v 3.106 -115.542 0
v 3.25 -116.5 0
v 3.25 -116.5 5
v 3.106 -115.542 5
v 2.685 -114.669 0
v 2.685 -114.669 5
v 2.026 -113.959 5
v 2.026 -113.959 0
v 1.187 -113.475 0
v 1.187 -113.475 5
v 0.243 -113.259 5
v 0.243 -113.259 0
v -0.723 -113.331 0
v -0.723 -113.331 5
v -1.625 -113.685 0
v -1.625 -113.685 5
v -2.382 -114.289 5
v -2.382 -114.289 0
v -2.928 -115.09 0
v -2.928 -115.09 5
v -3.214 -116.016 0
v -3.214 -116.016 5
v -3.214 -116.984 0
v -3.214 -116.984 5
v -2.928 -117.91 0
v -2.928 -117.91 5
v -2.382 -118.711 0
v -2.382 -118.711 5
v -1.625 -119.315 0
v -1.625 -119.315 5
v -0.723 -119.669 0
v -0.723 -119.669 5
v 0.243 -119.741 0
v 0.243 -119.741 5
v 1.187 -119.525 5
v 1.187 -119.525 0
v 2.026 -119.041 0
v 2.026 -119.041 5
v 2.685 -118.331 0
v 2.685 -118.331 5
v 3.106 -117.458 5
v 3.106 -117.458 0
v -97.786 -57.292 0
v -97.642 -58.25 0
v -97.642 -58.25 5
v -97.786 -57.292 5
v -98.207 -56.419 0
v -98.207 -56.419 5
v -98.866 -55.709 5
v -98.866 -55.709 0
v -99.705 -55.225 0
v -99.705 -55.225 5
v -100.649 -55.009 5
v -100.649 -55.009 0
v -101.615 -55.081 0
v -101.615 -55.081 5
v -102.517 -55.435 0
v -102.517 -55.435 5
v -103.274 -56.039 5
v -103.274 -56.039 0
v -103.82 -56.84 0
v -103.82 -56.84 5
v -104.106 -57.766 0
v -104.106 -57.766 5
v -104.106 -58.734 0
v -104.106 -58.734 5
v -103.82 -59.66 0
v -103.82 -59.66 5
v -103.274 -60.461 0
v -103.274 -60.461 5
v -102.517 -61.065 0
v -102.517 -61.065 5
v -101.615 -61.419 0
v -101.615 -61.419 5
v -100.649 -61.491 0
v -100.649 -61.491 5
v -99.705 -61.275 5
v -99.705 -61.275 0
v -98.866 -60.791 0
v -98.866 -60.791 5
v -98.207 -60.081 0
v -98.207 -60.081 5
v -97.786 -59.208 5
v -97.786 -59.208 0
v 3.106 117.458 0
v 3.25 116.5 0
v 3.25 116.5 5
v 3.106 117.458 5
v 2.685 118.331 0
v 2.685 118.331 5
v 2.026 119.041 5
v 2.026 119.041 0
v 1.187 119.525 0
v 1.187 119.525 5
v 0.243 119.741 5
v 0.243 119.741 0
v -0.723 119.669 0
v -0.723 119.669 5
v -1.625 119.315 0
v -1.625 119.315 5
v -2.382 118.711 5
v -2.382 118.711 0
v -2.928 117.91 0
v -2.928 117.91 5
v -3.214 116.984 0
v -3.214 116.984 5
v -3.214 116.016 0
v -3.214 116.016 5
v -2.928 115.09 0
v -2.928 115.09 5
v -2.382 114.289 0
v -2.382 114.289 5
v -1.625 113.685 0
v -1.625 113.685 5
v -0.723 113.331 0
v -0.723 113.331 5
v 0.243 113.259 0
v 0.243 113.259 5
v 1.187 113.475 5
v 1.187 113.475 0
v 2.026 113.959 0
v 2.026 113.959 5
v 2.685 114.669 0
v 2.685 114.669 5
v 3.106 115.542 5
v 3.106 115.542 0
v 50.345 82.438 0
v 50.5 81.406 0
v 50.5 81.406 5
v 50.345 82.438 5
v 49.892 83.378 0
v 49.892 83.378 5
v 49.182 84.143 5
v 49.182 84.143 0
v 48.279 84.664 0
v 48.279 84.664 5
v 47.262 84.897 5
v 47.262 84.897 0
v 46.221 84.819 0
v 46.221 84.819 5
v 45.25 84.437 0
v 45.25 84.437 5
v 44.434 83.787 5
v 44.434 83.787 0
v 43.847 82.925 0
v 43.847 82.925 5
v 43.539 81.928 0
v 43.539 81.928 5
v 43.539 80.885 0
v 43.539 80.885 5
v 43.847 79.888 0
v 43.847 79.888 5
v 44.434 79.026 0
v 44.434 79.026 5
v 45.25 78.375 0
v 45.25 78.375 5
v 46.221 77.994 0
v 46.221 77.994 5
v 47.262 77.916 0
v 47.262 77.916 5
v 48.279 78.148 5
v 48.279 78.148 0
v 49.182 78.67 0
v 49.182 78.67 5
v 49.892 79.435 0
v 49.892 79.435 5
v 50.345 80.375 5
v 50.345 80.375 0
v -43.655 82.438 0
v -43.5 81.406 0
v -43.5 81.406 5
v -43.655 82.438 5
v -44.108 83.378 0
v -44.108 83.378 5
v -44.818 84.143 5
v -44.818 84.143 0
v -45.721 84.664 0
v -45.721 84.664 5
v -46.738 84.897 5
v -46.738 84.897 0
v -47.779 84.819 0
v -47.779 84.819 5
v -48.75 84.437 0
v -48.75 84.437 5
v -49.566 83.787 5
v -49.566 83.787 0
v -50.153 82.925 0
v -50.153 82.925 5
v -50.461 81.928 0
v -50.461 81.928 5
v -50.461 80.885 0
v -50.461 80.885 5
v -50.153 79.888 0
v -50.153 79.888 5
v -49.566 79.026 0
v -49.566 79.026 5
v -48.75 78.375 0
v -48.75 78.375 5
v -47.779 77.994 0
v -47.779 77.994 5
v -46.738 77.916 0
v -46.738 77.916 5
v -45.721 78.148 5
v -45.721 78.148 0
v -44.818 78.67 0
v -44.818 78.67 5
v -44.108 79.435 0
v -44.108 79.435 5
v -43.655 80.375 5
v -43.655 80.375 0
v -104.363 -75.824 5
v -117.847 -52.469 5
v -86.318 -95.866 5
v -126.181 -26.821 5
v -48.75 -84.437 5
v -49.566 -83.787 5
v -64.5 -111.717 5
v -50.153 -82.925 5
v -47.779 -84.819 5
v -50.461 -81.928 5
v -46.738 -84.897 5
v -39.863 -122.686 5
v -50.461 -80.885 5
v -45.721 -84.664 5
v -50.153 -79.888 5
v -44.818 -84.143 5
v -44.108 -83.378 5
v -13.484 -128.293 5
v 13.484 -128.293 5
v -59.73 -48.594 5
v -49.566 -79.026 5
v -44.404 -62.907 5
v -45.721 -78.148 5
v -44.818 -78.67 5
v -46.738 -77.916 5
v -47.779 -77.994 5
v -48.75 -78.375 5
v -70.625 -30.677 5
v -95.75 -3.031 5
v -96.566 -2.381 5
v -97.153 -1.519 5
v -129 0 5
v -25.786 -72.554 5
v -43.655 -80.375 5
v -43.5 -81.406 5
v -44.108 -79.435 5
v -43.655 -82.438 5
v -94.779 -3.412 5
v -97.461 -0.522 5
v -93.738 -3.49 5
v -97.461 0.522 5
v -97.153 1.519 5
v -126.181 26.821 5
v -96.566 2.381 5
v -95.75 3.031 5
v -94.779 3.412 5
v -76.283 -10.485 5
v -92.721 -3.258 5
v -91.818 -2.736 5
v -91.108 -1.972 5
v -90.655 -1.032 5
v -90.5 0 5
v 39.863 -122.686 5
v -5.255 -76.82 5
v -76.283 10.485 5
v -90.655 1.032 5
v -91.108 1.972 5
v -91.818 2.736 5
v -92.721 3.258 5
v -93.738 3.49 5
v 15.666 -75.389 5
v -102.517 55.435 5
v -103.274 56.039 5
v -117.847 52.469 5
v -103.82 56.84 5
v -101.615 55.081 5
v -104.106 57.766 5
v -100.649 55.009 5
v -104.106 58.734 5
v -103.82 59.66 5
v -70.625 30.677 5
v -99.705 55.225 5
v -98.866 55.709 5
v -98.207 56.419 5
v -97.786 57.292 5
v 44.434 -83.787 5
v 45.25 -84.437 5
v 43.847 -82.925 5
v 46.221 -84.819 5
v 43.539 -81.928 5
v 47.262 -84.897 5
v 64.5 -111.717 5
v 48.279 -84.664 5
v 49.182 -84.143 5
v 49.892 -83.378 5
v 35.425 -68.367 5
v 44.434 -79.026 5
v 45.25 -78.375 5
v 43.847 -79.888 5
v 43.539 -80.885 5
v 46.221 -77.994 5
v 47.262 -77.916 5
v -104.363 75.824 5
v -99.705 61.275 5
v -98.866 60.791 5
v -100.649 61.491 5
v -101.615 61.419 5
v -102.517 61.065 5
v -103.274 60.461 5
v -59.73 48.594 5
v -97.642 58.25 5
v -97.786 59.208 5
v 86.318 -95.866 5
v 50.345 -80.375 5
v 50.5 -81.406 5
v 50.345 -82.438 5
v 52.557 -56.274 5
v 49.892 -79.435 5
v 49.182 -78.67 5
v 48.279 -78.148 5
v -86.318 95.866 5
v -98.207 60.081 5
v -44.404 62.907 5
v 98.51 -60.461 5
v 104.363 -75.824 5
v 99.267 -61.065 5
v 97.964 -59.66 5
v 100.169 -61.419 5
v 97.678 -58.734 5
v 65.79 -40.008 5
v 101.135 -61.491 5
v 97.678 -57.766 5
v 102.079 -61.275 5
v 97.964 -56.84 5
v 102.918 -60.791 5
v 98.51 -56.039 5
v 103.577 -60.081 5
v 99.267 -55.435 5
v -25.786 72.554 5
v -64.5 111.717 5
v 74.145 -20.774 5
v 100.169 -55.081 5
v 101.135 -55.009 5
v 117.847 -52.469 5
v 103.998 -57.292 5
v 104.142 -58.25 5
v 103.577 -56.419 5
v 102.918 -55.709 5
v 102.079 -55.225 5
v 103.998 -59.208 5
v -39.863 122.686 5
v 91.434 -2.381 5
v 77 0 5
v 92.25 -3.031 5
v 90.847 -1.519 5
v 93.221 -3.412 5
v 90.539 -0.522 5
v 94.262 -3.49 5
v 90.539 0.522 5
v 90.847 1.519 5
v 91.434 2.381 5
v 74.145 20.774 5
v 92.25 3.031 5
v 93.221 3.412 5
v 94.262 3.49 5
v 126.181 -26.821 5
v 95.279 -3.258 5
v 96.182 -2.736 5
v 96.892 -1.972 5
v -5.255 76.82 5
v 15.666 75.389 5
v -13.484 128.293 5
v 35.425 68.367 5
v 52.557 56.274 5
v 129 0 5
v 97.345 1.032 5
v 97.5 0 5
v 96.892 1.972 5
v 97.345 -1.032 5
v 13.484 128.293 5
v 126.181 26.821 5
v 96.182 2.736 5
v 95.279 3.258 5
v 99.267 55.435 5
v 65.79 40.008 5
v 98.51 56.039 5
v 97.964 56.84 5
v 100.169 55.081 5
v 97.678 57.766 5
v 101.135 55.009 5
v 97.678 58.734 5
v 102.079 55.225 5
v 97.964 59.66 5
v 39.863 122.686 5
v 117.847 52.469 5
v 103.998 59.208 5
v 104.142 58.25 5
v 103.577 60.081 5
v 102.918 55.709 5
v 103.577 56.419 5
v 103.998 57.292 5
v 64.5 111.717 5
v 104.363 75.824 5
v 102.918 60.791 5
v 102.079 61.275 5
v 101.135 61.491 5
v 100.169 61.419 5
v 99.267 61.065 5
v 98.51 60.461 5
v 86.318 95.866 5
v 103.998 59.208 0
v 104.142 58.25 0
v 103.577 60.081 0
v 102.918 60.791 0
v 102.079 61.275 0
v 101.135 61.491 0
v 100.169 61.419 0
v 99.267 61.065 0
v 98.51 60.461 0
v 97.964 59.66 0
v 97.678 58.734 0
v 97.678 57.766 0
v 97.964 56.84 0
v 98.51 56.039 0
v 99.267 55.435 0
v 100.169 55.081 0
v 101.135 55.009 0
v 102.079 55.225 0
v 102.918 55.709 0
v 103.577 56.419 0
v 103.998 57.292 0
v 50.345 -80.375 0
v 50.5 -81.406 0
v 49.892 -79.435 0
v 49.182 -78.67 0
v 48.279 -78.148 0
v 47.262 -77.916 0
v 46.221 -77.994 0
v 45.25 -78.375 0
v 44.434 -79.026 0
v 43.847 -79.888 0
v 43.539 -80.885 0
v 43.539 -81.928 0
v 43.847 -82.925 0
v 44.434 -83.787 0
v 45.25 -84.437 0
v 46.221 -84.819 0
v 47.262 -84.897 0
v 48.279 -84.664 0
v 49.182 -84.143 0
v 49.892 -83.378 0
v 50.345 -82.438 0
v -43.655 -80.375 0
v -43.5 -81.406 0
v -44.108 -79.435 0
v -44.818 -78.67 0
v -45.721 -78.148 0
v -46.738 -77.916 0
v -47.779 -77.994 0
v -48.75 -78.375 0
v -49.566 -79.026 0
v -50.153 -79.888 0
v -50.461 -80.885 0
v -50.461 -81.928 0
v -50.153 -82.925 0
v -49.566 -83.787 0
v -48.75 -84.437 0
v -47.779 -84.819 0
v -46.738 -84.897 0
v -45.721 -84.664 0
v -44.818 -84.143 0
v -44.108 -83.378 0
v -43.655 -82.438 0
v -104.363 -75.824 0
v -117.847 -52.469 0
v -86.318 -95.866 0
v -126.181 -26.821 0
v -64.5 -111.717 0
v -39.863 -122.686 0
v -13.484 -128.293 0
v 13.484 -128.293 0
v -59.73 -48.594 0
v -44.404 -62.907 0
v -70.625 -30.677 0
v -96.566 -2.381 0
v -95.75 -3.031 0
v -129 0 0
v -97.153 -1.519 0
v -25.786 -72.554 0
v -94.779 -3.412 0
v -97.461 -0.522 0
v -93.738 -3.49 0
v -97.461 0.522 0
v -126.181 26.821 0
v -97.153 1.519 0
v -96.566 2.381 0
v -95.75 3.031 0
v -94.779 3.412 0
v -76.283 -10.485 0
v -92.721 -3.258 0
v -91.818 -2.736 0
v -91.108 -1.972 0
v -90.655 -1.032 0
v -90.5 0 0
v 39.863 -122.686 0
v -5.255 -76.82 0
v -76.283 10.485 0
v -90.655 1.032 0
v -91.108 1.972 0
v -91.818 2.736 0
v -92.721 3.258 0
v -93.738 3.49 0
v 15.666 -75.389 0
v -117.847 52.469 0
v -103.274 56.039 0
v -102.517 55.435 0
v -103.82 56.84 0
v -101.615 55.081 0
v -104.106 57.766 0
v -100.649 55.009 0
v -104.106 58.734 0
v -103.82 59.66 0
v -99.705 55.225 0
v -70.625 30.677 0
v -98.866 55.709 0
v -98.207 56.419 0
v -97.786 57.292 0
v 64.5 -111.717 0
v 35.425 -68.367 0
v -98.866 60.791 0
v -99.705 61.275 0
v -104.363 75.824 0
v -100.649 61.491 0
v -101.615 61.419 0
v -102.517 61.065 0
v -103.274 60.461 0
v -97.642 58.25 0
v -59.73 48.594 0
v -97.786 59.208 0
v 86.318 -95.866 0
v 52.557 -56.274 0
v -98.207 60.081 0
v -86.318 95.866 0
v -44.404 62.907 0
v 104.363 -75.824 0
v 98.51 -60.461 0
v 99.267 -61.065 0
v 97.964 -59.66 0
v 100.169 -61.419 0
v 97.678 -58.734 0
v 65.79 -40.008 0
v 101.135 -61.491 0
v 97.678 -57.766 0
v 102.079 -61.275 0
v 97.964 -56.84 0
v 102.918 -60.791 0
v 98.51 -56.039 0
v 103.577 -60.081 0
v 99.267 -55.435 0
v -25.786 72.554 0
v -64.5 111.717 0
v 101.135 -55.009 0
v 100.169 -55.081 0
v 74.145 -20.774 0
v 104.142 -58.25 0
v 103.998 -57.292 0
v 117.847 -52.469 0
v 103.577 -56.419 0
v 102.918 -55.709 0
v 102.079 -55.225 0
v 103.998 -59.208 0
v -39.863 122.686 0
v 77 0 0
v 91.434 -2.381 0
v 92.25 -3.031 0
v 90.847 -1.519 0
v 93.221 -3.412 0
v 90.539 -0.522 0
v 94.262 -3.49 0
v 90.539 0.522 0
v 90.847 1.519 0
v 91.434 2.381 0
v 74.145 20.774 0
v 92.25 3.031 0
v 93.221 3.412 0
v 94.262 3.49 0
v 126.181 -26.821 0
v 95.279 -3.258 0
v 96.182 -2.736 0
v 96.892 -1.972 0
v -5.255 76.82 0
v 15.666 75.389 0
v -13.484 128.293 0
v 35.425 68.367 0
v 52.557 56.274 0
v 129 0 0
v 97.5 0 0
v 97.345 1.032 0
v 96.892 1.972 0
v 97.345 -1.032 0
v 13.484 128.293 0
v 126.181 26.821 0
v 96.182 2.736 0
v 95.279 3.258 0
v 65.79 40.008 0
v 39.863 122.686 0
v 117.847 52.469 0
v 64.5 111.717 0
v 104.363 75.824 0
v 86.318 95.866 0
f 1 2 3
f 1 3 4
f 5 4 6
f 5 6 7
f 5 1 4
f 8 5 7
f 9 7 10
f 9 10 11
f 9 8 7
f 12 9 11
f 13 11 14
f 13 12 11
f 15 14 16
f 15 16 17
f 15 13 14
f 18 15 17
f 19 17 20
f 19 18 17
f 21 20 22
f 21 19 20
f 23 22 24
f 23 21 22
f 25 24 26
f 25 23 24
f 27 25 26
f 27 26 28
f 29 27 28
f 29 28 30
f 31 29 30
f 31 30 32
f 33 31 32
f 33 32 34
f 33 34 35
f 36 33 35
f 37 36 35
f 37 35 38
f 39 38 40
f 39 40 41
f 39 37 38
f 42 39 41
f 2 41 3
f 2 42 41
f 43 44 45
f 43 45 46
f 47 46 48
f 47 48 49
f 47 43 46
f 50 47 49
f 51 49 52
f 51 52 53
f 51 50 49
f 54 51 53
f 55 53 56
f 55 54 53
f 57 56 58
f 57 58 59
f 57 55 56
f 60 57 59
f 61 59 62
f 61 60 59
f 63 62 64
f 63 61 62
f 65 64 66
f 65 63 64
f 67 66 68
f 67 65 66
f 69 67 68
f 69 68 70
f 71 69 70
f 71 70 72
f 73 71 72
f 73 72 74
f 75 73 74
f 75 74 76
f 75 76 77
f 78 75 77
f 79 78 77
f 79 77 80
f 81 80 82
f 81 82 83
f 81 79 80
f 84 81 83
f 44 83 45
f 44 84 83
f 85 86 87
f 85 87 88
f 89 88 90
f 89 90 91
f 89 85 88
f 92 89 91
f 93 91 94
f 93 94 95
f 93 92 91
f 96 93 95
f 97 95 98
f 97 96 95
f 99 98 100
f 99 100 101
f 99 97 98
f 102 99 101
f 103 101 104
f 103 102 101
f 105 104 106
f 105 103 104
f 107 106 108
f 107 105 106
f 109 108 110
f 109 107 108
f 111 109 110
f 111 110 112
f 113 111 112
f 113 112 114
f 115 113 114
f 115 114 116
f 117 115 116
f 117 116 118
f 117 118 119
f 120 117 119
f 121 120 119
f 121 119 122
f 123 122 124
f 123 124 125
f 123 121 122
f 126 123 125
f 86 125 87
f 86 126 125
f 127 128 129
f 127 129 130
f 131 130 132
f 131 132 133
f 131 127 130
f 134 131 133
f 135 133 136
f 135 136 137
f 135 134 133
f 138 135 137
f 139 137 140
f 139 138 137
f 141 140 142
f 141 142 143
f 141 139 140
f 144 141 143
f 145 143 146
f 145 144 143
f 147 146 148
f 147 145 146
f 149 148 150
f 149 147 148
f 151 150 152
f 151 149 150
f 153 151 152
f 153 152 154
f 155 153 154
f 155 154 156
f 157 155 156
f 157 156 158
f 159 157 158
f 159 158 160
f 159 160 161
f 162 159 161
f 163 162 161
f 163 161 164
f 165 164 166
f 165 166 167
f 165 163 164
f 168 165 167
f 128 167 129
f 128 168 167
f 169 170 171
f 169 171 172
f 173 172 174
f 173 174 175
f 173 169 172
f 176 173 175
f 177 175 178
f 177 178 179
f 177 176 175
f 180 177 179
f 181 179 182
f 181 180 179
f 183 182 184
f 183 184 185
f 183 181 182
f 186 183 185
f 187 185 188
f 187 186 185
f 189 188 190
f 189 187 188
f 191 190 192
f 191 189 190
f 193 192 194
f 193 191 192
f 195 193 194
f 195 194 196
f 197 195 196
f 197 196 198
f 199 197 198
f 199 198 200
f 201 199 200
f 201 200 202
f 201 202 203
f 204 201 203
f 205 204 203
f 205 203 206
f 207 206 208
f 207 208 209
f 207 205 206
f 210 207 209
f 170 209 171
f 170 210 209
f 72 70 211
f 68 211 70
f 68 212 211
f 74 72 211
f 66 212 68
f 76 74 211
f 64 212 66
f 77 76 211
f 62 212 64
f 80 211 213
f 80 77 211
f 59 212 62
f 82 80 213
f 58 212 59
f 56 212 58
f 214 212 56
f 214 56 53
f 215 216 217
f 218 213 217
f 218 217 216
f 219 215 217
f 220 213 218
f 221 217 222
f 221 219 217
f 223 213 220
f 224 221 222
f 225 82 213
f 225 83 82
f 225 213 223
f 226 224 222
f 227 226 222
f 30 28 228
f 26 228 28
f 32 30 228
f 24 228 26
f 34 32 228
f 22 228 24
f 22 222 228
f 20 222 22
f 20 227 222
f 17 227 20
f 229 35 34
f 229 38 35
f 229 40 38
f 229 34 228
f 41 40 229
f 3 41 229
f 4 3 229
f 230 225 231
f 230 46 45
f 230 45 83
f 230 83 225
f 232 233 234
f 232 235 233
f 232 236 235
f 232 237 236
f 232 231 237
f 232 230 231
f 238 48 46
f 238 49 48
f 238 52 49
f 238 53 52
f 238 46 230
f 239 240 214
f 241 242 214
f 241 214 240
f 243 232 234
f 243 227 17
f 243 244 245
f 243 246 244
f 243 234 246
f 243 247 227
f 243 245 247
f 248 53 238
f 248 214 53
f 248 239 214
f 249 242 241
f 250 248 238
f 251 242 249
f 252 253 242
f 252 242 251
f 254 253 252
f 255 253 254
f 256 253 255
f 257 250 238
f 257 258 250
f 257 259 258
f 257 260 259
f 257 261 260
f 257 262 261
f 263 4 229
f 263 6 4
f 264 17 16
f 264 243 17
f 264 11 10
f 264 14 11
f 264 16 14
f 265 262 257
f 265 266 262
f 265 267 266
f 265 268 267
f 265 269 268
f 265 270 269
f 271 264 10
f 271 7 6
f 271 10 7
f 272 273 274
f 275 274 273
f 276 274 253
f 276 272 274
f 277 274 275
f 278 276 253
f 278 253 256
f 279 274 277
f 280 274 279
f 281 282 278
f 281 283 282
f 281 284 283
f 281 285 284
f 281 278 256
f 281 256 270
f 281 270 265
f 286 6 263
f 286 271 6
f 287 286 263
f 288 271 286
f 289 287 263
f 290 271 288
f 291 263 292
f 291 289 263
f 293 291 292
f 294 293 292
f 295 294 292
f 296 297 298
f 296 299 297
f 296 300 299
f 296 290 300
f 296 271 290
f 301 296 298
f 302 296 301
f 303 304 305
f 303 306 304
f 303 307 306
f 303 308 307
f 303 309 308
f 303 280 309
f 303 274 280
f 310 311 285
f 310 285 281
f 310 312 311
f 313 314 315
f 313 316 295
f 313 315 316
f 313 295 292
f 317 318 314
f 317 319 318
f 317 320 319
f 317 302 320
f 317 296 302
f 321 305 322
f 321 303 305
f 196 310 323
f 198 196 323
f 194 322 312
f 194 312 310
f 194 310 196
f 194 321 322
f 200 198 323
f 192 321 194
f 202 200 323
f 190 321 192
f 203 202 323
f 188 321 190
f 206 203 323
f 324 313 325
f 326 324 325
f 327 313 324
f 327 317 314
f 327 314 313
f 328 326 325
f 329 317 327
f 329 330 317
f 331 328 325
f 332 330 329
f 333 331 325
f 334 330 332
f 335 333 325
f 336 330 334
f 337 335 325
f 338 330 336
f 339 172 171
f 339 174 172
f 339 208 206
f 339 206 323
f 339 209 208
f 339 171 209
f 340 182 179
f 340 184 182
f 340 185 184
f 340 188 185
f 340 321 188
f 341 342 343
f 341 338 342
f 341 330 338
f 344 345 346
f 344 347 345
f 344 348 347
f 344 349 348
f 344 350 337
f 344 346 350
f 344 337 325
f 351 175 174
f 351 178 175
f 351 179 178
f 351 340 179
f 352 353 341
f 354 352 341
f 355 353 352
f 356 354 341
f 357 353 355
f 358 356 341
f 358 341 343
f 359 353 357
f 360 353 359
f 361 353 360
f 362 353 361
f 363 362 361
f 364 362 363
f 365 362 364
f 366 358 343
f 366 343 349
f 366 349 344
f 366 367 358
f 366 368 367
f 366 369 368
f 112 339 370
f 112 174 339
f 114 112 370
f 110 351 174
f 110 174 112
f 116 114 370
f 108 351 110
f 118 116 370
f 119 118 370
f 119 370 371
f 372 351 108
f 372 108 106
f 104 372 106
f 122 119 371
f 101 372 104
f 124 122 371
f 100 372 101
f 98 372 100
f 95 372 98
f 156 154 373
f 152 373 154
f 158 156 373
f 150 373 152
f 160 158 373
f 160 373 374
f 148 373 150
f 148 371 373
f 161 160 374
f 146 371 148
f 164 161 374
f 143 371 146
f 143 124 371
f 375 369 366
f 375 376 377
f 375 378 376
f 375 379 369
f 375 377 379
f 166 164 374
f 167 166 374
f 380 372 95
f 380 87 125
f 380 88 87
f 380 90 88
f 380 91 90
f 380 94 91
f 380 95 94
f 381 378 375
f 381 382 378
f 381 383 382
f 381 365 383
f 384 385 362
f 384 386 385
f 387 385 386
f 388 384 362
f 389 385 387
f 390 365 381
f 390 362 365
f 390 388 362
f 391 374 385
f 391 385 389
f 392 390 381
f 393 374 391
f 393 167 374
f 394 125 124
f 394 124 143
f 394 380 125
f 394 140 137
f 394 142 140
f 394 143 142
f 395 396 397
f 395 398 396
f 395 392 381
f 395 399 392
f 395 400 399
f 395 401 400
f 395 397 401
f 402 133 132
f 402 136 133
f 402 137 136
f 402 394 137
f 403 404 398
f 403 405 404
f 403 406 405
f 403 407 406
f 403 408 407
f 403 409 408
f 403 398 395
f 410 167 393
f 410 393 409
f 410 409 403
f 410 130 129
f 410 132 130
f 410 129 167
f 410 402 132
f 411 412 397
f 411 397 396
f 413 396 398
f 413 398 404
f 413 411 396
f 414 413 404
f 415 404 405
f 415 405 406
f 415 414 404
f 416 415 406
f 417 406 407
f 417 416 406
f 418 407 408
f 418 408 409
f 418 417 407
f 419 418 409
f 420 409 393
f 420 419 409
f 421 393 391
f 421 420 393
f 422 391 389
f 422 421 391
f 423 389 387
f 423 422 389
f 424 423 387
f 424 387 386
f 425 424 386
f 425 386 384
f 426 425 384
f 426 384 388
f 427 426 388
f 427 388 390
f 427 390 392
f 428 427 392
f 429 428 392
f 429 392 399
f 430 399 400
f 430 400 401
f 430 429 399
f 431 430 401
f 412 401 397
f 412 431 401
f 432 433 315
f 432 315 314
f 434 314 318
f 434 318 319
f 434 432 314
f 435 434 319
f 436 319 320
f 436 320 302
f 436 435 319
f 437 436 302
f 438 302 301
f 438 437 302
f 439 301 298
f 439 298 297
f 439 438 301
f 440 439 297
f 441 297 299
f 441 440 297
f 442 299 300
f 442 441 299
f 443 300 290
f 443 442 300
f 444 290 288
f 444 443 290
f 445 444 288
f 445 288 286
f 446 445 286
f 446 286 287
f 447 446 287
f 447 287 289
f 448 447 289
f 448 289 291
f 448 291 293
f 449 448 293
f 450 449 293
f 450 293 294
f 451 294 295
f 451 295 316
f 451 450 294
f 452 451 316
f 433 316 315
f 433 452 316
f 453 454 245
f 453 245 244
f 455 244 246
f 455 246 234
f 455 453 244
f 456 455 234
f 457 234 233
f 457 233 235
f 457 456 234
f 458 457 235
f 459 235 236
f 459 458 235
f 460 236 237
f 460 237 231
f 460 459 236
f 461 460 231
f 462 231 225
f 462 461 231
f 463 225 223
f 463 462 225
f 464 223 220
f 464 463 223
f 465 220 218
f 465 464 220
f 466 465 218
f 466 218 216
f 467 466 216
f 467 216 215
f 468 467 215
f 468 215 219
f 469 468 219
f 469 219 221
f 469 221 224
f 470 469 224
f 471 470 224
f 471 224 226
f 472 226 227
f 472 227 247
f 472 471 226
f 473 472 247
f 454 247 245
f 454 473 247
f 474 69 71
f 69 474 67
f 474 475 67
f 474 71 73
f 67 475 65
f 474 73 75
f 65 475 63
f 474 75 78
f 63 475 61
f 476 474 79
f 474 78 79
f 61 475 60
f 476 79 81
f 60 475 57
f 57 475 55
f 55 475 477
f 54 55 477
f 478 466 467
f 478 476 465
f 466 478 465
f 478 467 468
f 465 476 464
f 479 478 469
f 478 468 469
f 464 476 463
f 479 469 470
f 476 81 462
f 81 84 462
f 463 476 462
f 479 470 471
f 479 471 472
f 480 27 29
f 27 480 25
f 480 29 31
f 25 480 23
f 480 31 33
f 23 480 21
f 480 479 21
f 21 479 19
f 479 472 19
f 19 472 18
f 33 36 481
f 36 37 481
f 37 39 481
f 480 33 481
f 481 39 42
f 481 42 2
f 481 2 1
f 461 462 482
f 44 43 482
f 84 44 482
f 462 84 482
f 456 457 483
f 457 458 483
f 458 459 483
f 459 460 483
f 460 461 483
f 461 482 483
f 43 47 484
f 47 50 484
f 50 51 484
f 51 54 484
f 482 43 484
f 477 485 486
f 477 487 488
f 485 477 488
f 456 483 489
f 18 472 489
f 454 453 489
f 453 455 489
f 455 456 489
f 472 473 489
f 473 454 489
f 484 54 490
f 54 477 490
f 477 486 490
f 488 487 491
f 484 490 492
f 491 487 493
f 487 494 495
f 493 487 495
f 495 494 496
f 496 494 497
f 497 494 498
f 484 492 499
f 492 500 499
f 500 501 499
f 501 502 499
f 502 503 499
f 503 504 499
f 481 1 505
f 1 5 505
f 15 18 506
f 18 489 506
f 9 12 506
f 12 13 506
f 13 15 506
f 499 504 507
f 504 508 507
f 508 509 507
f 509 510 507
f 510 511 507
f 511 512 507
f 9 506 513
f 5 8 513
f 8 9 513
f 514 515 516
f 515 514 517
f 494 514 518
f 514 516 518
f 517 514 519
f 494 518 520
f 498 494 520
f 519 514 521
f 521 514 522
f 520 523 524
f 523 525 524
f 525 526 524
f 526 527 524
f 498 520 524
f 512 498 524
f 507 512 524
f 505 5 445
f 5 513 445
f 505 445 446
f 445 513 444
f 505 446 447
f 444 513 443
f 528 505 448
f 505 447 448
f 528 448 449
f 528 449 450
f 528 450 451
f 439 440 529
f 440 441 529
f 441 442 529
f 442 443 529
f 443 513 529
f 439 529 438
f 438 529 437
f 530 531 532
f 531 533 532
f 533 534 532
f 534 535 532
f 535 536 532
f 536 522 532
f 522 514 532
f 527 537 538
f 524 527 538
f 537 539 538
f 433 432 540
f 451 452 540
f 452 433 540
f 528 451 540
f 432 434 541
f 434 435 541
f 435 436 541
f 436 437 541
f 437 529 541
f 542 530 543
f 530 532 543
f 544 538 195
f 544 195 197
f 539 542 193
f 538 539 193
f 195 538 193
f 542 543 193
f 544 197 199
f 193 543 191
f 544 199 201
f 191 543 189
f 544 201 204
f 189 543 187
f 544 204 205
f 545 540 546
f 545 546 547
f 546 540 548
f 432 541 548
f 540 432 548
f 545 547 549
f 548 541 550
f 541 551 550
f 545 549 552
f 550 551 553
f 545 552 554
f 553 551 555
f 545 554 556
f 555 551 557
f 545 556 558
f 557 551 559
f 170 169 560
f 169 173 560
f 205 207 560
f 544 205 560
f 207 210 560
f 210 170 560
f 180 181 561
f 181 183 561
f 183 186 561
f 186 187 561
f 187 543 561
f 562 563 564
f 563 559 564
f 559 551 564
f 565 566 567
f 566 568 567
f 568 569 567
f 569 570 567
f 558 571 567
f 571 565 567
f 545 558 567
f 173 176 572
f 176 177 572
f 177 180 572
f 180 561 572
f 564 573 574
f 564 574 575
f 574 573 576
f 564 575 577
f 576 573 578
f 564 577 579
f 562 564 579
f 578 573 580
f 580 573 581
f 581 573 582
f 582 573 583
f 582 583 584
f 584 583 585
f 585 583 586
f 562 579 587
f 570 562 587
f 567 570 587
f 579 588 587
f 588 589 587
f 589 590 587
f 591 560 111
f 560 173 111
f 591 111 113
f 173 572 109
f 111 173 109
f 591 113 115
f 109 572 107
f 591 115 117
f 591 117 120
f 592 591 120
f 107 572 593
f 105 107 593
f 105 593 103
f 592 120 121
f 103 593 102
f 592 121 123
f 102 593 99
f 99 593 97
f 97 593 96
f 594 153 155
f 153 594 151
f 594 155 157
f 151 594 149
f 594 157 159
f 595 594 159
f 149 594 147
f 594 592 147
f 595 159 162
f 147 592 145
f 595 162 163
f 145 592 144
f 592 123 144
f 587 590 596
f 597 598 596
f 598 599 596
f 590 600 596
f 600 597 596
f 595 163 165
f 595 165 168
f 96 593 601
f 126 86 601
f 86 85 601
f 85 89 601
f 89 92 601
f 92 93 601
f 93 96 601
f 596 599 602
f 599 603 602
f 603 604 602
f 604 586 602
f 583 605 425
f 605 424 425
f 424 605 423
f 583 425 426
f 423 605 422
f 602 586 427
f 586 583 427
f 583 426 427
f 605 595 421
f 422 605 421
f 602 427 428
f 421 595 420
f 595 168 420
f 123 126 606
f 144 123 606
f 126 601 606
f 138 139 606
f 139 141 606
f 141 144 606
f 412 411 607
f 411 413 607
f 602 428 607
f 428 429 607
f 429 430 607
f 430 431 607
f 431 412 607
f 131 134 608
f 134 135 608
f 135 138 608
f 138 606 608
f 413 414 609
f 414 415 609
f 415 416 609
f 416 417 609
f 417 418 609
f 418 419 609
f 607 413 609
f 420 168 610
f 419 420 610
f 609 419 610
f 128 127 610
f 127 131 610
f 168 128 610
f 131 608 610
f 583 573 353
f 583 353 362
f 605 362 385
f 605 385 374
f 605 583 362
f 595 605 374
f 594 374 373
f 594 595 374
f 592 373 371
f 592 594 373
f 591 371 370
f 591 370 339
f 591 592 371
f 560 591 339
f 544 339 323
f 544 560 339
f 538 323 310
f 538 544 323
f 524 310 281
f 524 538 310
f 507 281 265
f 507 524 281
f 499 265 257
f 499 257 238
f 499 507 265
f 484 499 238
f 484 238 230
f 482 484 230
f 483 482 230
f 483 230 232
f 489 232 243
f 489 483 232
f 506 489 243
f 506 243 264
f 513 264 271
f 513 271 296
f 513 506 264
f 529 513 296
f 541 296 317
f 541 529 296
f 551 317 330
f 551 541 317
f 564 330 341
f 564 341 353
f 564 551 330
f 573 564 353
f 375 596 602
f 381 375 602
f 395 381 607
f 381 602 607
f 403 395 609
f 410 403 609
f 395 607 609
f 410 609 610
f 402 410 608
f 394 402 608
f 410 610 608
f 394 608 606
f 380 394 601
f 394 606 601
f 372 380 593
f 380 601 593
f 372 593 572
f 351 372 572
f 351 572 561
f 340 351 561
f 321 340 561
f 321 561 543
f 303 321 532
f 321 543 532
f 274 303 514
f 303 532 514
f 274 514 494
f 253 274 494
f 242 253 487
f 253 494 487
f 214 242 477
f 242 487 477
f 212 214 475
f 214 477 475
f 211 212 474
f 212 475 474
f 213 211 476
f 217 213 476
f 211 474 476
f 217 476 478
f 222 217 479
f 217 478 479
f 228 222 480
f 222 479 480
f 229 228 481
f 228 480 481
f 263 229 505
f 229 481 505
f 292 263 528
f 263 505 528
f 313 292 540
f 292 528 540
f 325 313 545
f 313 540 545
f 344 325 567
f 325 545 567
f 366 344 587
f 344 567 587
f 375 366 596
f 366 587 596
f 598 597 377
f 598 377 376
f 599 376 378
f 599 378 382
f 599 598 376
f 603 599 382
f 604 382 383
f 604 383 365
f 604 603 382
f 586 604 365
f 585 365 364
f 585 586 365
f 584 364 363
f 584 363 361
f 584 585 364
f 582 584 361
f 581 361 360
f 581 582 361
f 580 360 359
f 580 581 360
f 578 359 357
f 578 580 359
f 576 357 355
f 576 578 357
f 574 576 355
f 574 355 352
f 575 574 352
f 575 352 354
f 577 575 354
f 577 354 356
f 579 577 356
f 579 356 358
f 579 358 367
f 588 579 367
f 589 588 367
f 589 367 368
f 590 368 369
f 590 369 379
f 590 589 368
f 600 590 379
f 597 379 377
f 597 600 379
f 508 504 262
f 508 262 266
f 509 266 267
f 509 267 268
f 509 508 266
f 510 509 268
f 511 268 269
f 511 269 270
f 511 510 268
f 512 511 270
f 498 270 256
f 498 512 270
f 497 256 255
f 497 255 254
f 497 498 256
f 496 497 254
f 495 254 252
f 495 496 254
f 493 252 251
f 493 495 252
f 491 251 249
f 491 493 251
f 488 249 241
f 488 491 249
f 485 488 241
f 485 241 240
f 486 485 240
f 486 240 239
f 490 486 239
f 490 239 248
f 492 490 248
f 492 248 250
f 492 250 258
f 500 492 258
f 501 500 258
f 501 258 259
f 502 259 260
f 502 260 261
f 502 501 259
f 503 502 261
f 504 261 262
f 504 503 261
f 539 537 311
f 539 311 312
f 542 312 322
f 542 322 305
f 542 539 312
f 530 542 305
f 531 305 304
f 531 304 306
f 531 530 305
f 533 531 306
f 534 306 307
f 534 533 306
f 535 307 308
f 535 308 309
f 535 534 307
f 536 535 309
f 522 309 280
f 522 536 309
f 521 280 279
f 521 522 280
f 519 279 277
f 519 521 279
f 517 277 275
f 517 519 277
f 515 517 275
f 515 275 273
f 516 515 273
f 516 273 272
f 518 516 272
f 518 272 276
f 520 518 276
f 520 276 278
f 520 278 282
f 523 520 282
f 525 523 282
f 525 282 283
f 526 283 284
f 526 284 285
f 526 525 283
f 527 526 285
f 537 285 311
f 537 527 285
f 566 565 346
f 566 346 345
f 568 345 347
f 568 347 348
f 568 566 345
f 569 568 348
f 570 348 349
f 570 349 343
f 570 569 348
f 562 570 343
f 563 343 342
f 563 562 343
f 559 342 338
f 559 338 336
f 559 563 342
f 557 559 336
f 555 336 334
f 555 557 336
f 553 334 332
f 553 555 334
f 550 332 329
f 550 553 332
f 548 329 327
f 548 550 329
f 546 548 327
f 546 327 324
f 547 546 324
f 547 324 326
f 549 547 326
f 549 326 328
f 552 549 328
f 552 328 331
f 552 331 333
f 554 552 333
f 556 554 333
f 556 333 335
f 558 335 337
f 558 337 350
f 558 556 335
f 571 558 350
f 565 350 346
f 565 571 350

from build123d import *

# Parameters (mm, degrees)
F0_R     = 129
F0_R_2   = 3.5
F0_R_3   = 3.25
F0_R_4   = 77
F1_DEPTH = 5


with BuildPart() as f1:
    # F0 (on Top) → F1 (new body)
    with BuildSketch(Plane.XY):
        Circle(F0_R)
        with Locations((-47, -81.406388)):
            Circle(F0_R_2, mode=Mode.SUBTRACT)
        with Locations((-100.89196, -58.25)):
            Circle(F0_R_3, mode=Mode.SUBTRACT)
        with Locations((0, -116.5)):
            Circle(F0_R_3, mode=Mode.SUBTRACT)
        with Locations((47, -81.406388)):
            Circle(F0_R_2, mode=Mode.SUBTRACT)
        with Locations((100.89196, -58.25)):
            Circle(F0_R_3, mode=Mode.SUBTRACT)
        with Locations((-94, 0)):
            Circle(F0_R_2, mode=Mode.SUBTRACT)
        with Locations((-100.89196, 58.25)):
            Circle(F0_R_3, mode=Mode.SUBTRACT)
        with Locations((-47, 81.406388)):
            Circle(F0_R_2, mode=Mode.SUBTRACT)
        Circle(F0_R_4, mode=Mode.SUBTRACT)
        with Locations((94, 0)):
            Circle(F0_R_2, mode=Mode.SUBTRACT)
        with Locations((100.89196, 58.25)):
            Circle(F0_R_3, mode=Mode.SUBTRACT)
        with Locations((47, 81.406388)):
            Circle(F0_R_2, mode=Mode.SUBTRACT)
        with Locations((0, 116.5)):
            Circle(F0_R_3, mode=Mode.SUBTRACT)
    extrude(amount=F1_DEPTH)


solid = f1.part
